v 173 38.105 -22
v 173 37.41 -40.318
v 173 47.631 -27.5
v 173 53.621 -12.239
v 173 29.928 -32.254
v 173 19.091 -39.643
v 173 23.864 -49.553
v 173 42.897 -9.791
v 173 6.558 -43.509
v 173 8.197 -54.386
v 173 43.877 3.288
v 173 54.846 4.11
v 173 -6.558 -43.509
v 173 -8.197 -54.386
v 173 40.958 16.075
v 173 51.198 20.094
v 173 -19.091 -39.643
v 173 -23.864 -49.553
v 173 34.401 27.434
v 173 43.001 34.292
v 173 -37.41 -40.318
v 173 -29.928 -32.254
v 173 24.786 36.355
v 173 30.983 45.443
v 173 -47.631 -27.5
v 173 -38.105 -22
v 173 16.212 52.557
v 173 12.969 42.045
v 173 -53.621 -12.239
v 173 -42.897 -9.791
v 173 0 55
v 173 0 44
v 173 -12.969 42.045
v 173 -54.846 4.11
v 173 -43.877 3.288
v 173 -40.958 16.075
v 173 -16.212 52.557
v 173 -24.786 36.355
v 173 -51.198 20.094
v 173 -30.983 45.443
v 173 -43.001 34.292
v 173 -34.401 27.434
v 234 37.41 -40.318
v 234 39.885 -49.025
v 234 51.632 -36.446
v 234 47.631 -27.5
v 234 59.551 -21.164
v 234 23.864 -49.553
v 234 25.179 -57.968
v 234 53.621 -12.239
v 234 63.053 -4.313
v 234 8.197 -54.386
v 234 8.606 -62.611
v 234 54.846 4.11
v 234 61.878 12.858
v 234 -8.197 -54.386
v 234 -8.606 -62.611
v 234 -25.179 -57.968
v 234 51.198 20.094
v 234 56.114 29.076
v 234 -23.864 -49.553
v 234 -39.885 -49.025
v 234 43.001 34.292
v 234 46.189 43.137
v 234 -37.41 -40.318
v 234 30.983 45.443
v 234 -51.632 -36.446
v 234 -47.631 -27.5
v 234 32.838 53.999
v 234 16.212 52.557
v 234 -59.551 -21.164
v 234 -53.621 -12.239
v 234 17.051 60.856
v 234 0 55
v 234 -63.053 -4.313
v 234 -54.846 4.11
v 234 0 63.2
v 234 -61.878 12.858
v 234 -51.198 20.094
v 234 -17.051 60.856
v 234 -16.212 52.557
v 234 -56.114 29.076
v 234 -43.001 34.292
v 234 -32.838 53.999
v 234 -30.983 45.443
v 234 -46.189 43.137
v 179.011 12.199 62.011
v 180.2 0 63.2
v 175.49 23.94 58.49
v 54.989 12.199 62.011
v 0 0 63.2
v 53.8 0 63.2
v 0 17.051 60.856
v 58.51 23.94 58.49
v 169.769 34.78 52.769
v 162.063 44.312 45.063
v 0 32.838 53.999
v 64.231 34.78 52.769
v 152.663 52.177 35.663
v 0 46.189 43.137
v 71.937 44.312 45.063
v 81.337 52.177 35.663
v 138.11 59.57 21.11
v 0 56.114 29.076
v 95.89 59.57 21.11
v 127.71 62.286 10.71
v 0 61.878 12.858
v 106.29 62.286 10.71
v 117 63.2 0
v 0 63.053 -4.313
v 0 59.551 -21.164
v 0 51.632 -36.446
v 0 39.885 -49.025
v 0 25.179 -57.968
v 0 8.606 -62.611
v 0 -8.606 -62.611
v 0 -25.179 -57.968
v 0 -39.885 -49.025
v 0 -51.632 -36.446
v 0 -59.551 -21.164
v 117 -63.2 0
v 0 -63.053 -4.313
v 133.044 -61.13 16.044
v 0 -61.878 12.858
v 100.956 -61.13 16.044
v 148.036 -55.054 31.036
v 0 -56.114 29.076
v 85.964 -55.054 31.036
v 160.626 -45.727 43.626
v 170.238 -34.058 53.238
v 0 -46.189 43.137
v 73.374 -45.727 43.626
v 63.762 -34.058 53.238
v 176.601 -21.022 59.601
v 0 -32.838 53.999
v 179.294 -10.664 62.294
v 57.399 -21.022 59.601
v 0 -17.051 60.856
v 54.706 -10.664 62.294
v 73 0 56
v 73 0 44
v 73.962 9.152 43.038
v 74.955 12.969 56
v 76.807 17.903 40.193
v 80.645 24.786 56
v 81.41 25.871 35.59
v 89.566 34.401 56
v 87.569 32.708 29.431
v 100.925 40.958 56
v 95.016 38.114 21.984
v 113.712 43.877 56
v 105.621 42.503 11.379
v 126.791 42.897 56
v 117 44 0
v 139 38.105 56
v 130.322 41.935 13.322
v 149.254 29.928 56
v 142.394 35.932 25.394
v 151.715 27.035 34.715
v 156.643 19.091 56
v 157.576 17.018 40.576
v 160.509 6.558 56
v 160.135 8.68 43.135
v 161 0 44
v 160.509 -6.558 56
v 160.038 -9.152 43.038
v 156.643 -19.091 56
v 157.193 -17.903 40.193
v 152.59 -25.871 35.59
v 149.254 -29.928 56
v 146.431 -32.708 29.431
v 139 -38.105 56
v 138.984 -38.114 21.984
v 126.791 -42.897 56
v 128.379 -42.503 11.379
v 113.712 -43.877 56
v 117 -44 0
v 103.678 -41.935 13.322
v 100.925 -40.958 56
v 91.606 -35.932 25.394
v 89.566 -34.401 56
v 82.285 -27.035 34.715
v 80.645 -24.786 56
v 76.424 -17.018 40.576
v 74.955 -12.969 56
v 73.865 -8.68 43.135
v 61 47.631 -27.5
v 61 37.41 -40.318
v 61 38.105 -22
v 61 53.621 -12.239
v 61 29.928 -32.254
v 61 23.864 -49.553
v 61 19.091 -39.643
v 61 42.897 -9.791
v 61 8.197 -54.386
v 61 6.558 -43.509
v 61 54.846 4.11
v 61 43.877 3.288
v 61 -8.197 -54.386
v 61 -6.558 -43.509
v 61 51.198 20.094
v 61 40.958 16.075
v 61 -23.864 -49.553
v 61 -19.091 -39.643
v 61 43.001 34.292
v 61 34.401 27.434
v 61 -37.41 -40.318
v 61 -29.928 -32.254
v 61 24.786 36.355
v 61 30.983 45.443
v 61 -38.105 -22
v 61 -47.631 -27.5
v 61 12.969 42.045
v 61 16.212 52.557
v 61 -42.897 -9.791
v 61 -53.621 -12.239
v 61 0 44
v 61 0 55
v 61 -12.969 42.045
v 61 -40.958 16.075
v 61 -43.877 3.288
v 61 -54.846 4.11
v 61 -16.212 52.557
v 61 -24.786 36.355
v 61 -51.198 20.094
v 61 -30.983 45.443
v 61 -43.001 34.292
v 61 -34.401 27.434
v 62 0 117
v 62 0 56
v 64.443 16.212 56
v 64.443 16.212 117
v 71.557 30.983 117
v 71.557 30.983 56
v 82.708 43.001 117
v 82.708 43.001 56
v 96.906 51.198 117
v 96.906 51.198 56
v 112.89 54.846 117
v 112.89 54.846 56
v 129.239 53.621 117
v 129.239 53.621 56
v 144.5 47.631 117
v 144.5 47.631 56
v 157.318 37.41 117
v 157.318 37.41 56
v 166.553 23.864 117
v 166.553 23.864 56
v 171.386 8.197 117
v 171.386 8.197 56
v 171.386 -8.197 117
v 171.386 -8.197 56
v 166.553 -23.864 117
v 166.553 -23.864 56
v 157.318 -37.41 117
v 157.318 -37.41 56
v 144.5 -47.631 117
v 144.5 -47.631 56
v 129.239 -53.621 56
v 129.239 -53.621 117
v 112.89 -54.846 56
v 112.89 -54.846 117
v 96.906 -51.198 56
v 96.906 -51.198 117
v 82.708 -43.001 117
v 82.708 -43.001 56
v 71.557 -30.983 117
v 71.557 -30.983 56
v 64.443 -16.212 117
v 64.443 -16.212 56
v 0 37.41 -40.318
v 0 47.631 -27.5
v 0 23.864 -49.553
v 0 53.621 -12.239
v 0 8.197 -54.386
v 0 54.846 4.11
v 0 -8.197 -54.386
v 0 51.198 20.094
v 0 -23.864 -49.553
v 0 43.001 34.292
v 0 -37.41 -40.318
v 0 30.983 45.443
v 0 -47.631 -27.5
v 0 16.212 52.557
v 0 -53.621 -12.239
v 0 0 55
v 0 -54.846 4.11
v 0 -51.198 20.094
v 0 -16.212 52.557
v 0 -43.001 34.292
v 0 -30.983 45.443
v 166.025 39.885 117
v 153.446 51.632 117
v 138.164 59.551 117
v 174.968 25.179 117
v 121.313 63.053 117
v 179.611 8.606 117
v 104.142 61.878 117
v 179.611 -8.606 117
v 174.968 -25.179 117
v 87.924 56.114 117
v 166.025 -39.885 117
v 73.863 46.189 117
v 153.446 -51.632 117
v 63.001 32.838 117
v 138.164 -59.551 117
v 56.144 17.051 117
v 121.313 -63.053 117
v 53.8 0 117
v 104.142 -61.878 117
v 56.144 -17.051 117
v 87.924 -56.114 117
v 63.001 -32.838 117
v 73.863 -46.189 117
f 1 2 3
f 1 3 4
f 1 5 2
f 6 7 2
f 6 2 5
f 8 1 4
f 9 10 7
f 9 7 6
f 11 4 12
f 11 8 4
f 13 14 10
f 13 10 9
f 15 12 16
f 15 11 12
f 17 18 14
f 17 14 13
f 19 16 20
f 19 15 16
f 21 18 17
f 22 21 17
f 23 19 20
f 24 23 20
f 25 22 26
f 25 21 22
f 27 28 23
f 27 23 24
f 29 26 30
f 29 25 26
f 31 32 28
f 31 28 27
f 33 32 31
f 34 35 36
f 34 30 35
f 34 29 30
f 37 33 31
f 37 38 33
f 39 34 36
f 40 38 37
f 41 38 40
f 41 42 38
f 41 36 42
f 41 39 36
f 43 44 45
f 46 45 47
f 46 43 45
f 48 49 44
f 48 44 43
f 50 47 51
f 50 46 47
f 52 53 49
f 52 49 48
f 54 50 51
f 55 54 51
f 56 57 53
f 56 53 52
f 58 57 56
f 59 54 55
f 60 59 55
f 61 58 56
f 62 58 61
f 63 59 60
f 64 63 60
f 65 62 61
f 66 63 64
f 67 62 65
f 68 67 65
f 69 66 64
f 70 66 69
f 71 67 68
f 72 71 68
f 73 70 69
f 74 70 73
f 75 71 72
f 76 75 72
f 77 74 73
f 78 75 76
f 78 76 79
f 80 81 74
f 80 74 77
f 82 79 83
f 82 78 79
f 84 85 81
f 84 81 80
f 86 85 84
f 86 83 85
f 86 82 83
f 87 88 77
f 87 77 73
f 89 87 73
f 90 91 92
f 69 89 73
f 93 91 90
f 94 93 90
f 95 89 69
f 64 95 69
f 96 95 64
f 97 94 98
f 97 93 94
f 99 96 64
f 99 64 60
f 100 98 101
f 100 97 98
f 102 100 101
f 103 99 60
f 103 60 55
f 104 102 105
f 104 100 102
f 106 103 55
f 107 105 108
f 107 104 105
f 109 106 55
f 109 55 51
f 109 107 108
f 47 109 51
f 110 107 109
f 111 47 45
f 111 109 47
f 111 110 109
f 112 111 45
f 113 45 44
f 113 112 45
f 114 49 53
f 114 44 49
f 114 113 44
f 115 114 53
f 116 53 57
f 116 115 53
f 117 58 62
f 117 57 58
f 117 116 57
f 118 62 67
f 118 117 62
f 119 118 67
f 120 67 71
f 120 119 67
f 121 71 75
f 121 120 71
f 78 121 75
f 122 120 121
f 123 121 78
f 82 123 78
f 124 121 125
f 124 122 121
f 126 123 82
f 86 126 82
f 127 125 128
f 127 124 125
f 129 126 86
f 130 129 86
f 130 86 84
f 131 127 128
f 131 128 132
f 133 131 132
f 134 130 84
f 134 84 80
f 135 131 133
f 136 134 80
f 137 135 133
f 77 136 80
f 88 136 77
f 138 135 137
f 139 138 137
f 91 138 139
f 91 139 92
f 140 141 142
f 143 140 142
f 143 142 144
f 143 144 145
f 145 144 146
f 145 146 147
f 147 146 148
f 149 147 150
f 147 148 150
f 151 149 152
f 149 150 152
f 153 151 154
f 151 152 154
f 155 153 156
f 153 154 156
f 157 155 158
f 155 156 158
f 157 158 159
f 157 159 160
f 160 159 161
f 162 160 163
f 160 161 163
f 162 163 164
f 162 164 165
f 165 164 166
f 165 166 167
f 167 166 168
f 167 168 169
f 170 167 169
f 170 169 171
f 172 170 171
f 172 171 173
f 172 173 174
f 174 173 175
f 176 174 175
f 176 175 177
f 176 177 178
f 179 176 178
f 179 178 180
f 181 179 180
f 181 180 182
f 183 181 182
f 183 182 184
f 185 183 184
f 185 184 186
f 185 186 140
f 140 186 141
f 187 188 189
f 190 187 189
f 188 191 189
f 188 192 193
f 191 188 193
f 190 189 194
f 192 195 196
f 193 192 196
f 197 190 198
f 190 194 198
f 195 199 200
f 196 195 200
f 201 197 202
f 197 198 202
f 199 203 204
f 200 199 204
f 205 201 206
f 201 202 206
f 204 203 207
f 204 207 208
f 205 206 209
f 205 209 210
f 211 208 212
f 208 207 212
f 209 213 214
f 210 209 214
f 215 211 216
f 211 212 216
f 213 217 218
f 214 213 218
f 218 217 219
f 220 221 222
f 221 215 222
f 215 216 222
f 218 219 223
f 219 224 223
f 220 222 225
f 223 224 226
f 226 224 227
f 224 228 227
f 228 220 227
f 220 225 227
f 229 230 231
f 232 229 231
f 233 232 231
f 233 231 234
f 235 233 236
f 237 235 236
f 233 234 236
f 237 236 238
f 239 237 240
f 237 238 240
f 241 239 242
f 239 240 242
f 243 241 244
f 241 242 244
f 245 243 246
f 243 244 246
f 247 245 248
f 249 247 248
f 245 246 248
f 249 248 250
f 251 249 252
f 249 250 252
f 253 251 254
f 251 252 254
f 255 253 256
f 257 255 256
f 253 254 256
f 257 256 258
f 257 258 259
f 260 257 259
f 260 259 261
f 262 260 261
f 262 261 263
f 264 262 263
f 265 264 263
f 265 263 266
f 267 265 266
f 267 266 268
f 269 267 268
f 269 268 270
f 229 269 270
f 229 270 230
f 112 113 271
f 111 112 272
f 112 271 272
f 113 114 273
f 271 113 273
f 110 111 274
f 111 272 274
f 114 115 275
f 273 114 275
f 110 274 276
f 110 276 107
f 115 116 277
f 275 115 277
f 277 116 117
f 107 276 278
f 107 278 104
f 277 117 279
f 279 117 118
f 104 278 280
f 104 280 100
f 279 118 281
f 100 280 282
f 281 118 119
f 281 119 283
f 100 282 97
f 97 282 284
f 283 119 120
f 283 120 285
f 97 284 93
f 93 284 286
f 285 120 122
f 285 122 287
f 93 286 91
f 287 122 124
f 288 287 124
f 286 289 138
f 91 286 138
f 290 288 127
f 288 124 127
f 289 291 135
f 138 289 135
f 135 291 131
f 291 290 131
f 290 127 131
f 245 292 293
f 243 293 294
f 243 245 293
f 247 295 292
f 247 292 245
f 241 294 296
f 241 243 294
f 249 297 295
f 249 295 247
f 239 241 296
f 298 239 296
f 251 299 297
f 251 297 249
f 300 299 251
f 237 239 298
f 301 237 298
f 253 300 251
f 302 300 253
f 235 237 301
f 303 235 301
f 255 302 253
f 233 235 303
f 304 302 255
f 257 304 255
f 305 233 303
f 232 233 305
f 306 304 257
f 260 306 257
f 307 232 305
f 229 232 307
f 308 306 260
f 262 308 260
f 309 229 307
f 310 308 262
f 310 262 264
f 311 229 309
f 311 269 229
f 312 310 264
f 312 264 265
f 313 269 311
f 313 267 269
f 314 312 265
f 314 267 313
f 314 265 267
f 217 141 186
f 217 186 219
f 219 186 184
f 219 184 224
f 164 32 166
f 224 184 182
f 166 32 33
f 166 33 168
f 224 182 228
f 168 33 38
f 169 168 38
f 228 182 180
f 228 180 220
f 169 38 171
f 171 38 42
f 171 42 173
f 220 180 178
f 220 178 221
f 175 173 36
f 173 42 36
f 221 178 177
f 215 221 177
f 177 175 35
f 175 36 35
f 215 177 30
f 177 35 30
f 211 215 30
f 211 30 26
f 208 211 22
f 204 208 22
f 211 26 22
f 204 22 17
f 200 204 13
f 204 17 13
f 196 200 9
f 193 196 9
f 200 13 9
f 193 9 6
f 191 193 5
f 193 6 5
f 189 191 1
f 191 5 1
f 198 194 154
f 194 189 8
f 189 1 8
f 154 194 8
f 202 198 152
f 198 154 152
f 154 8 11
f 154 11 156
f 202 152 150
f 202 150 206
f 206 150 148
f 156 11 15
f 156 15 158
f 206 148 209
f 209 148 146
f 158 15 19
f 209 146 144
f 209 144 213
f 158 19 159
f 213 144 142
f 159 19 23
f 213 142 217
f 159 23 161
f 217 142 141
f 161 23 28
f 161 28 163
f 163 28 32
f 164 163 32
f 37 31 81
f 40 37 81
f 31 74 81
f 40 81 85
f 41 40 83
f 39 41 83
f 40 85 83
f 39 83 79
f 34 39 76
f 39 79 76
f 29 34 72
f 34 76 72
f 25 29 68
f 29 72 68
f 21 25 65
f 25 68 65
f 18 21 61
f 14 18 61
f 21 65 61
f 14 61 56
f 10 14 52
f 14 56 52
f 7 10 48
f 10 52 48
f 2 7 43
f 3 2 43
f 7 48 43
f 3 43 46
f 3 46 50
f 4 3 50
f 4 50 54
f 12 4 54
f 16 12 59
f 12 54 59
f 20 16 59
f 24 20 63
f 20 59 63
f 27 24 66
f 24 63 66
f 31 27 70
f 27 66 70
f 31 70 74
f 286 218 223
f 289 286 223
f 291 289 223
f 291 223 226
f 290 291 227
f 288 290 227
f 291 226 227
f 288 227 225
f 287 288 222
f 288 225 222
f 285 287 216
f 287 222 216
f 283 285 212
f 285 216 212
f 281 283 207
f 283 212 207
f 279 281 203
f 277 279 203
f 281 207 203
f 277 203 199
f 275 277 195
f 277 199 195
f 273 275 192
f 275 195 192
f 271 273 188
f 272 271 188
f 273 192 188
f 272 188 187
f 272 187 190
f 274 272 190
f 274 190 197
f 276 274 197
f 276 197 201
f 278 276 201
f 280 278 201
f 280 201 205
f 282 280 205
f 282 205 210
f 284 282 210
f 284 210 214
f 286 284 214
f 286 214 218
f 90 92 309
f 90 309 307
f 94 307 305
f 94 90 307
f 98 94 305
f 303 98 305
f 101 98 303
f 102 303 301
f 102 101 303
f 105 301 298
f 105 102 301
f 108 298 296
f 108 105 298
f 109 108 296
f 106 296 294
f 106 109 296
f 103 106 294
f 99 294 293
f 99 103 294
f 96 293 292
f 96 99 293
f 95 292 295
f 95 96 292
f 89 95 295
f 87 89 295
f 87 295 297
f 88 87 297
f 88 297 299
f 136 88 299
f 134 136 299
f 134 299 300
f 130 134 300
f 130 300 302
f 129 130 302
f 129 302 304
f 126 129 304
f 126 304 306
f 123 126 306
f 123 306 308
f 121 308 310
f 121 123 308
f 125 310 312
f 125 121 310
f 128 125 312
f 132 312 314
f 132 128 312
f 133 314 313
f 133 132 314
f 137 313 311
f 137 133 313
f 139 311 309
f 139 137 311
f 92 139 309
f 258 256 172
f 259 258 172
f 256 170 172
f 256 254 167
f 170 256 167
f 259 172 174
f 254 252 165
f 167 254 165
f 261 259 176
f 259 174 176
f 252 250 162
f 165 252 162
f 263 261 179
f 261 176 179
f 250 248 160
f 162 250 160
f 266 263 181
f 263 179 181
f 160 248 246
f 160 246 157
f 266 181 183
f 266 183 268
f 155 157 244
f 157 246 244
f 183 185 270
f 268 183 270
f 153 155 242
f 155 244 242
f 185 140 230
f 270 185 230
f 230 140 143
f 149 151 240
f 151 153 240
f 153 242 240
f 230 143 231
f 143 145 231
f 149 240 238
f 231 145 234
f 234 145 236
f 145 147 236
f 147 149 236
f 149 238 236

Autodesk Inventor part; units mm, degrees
ref_plane "YZ Plane" through (0, 0, 0) normal (1, 0, 0) x (0, 1, 0)
ref_plane "XZ Plane" through (0, 0, 0) normal (0, 1, 0) x (-1, 0, 0)
ref_plane "XY Plane" through (0, 0, 0) normal (0, 0, 1) x (1, 0, 0)
sketch "Sketch1" plane through (0, 0, 0) normal (0, 1, 0) x (-1, 0, 0)
  line L0 (0, 0) -> (-234, 0)
  line L1 (-234, 0) -> (-234, 63.2)
  line L2 (-234, 63.2) -> (0, 63.2)
  line L3 (0, 63.2) -> (0, 0)
  dimension "d0" = 234
  dimension "d2" = 126.4
revolve "Revolution1" add sketch "Sketch1" angle 360 about axis through (0, 0, 0) along (1, 0, 0)
sketch "Sketch3" plane through (0, 0, 0) normal (0, 1, 0) x (-1, 0, 0)
  line L0 (-180.2, 117) -> (-53.8, 117) projected
  line L1 (0, -63.2) -> (0, 63.2) projected
  line L2 (-234, -63.2) -> (-234, 63.2) projected
  line L3 (0, 0) -> (-234, 0)
  line L4 (-117, 117) -> (-117, 0)
  line L5 (-62, 117) -> (-62, 56)
  line L6 (-62, 56) -> (-73, 56)
  line L7 (-73, 56) -> (-73, 0)
  dimension "d5" = 110
  dimension "d6" = 88
  dimension "d8" = 61
sketch "Sketch2" plane through (0, 0, 0) normal (0, 1, 0) x (-1, 0, 0)
  line L0 (0, 0) -> (-234, 0)
  line L1 (-117, 0) -> (-117, 117)
  line L2 (-117, 117) -> (-53.8, 117)
  line L3 (-53.8, 117) -> (-53.8, 0)
  line L4 (0, -63.2) -> (0, 63.2) projected
  line L5 (-234, -63.2) -> (-234, 63.2) projected
  point P0 (-15, 117)
  point P1 (-117, 9)
  dimension "d3" = 126.4
  dimension "d4" = 117
revolve "Revolution2" add sketch "Sketch2" angle 360 about axis through (117, 0, 0) along (0, 0, 1)
revolve "Revolution3" cut sketch "Sketch3" angle 360 about axis through (117, 0, 117) along (0, 0, -1)
sketch "Sketch4" plane through (0, 0, 0) normal (0, 1, 0) x (-1, 0, 0)
  line L0 (0, -63.2) -> (0, 63.2) projected
  line L1 (-234, -63.2) -> (-234, 63.2) projected
  line L2 (0, 0) -> (-234, 0)
  line L3 (0, 55) -> (-61, 55)
  line L4 (-61, 55) -> (-61, 44)
  line L5 (-61, 44) -> (-173, 44)
  line L6 (-173, 44) -> (-173, 55)
  line L7 (-173, 55) -> (-234, 55)
  dimension "d9" = 110
  dimension "d10" = 110
  dimension "d11" = 88
  dimension "d12" = 61
  dimension "d14" = 61
revolve "Revolution4" cut sketch "Sketch4" angle 360 about axis through (0, 0, 0) along (1, 0, 0)
equation "\"d0\" = 2 * z1 + 2 * t1"
equation "\"d2\" = d1 + 2 * h1"
equation "\"d5\" = d1"
equation "\"d6\" = 0.8 * d1"
equation "\"d8\" = t1"
equation "\"d9\" = d1"
equation "\"d10\" = d1"
equation "\"d11\" = 0.8 * d1"
equation "\"d12\" = t1"
equation "\"d14\" = t1"
equation "\"d3\" = d1 + 2 * h1"
equation "\"d4\" = z1 + t1"
equation "\"d1\" = 110"
equation "\"z1\" = 56"
equation "\"t1\" = 61"
equation "\"h1\" = 8.2"
properties part number "DIN 8063 Тройник, тип T 110" material "ПВХ, непластифицированный"
